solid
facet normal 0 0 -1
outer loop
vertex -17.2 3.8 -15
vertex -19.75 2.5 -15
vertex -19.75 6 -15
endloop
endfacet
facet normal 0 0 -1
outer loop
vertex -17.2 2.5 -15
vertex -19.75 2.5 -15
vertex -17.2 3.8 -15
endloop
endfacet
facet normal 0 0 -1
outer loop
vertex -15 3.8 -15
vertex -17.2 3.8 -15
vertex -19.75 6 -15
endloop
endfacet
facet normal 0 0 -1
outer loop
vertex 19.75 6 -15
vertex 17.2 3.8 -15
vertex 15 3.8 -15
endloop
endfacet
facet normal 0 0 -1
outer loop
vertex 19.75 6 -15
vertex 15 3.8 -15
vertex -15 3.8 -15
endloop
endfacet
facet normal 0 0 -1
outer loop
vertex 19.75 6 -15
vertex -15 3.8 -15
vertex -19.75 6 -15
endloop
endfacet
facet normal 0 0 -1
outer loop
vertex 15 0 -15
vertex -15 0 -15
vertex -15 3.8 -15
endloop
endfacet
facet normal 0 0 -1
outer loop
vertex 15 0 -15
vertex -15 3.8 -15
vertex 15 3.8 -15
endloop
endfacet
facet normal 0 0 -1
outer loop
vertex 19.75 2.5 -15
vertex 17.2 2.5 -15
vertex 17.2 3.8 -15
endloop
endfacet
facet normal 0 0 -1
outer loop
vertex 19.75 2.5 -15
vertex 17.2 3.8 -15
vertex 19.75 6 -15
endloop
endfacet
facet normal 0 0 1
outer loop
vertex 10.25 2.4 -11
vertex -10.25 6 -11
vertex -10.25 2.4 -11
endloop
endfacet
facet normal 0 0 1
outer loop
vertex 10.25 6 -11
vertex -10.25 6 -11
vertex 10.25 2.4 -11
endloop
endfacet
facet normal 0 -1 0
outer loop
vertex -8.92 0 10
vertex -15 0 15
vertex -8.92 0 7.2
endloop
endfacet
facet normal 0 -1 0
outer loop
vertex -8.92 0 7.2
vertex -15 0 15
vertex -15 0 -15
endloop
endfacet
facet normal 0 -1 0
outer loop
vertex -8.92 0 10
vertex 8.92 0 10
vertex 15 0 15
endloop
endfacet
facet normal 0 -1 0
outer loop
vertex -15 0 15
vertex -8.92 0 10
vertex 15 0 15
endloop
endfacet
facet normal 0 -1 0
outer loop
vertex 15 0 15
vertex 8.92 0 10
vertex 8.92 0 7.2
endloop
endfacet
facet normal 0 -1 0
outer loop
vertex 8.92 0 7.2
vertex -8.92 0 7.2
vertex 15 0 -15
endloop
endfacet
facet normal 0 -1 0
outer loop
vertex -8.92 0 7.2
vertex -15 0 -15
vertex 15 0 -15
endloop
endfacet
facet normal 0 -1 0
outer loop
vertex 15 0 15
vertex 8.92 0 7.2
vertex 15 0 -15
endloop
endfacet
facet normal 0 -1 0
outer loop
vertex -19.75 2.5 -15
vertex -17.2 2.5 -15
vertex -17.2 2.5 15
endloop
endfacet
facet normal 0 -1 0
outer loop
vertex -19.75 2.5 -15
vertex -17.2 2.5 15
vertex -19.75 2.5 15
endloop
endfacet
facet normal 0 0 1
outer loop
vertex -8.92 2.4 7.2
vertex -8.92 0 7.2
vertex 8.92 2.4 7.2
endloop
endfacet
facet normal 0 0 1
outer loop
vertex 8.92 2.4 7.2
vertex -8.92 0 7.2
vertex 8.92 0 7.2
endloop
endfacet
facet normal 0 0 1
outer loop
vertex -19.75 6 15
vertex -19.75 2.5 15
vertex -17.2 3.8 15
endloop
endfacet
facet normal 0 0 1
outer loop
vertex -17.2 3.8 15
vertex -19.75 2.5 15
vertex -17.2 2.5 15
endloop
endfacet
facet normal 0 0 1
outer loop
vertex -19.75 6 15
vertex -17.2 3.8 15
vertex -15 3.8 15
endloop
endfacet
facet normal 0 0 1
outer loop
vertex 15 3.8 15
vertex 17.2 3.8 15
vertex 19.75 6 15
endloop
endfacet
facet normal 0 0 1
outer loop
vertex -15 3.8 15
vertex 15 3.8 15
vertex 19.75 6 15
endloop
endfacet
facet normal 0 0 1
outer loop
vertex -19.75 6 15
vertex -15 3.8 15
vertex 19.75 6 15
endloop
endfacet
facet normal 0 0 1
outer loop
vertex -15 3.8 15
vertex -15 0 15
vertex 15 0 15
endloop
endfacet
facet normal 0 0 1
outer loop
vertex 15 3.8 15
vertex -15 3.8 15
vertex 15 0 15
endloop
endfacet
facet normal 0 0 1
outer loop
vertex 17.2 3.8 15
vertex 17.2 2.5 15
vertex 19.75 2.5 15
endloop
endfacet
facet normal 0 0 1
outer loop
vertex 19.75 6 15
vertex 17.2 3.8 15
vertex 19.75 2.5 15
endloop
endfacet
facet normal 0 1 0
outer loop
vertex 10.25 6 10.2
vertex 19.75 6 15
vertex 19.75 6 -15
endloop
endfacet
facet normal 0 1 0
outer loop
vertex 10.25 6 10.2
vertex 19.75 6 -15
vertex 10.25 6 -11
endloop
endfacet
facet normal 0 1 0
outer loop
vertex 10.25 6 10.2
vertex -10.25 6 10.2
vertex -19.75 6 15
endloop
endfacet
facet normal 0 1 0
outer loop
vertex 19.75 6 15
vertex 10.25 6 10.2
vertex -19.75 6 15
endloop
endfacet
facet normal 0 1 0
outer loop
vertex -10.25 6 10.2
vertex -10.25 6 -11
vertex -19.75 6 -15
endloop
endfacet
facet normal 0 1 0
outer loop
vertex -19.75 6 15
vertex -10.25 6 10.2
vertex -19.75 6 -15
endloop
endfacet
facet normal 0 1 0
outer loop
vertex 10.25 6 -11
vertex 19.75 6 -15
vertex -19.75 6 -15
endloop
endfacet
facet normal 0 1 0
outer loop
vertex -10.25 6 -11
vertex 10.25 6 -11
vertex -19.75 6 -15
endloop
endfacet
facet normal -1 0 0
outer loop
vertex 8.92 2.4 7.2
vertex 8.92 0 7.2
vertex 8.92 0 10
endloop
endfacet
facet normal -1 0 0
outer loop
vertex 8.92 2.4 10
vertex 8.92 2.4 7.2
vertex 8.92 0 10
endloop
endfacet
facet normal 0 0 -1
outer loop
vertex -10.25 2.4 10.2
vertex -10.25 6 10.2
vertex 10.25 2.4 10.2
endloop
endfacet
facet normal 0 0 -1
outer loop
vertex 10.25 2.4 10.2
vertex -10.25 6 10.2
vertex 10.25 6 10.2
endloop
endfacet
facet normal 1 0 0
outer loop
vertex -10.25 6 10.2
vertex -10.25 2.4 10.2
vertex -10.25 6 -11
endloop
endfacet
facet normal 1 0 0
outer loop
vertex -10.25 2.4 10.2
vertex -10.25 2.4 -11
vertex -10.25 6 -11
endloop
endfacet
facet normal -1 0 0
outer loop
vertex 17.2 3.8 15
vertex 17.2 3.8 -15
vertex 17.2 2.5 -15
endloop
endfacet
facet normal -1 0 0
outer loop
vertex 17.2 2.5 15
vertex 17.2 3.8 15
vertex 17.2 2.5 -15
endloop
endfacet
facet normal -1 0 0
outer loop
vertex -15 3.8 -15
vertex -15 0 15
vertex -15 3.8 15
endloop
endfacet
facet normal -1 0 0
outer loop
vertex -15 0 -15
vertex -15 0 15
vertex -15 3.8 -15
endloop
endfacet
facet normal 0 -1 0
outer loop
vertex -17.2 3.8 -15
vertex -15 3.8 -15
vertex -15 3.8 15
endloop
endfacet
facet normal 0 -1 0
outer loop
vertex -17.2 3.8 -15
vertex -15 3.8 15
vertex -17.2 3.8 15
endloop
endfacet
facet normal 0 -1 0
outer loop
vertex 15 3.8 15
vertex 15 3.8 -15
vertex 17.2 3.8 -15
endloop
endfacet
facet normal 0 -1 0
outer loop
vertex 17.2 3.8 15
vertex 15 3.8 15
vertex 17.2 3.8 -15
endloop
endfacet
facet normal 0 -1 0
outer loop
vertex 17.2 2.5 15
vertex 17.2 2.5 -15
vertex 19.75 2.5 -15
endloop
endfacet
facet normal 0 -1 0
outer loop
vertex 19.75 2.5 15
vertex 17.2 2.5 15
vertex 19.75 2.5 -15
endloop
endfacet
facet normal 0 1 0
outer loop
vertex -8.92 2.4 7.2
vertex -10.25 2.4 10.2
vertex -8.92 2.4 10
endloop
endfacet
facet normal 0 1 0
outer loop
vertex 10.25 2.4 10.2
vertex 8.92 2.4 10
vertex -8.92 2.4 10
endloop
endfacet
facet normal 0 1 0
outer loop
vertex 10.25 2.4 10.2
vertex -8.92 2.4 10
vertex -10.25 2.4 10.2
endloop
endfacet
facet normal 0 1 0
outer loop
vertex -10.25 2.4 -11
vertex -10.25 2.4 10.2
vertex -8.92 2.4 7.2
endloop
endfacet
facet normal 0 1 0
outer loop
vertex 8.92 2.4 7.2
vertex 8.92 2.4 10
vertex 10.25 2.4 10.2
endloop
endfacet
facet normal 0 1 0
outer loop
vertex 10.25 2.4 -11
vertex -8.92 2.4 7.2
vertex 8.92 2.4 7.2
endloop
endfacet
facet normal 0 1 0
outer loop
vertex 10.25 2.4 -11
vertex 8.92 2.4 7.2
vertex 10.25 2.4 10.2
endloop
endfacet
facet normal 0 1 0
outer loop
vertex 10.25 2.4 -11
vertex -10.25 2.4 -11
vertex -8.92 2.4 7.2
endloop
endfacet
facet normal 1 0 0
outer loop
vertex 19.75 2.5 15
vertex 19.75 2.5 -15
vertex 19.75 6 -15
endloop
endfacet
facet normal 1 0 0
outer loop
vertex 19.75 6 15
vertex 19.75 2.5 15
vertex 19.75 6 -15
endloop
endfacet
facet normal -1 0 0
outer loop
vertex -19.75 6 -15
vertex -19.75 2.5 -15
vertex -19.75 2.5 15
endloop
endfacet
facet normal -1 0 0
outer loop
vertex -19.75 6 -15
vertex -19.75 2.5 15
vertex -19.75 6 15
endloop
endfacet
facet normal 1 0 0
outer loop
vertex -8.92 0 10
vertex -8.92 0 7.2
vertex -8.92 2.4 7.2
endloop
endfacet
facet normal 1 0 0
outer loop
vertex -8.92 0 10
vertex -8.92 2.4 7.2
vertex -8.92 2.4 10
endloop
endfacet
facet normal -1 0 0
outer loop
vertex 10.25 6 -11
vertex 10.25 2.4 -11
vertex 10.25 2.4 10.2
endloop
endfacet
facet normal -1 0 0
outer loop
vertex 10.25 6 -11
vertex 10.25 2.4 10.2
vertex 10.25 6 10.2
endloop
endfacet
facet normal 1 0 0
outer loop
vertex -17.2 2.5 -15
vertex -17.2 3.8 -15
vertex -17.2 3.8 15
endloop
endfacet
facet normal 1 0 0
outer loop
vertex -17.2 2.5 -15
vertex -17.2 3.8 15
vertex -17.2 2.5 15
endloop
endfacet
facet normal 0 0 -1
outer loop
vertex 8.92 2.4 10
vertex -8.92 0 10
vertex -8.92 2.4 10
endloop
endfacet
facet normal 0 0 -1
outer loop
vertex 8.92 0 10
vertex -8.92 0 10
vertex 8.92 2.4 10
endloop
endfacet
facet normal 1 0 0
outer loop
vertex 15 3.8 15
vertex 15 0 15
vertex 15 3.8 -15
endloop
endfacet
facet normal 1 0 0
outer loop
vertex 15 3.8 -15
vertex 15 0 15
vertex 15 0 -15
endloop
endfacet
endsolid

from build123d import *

# Parameters (mm, degrees)
SKETCH1_W               = 30
SKETCH1_H               = 30
MAIN_BODY_DEPTH         = 11
SKETCH2_W               = 17.84
SKETCH2_H               = 2.8
WIRE_HOLE_DEPTH         = 6
BOARD_CAVITY_DEPTH      = 3
BOARD_CAVITY_DEPTH_BACK = 17.2
SKETCH3_W               = 20.5
SKETCH3_H               = 3.6
SKETCH4_W               = 10
SKETCH4_H               = 10
LIGHT_BOX_DEPTH         = 2
SKETCH5_R               = 1.5
CUT_EXTRUDE4_DEPTH      = 20
SKETCH7_W               = 20.5
SKETCH7_H               = 3.6
CUT_EXTRUDE5_DEPTH      = 1
BOSS_EXTRUDE1_DEPTH     = 30
BOSS_EXTRUDE2_START     = 0.6
SKETCH11_W              = 10
SKETCH11_H              = 10
SKETCH11_R              = 1.5
BOSS_EXTRUDE2_DEPTH     = 0.6
SKETCH12_W              = 44.814636294
SKETCH12_H              = 7.577756332
CUT_EXTRUDE6_DEPTH      = 40


with BuildPart() as part:
    # Sketch1 → Main Body (new body)
    with BuildSketch(Plane(origin=(0, 0, 0), x_dir=(1, 0, 0), z_dir=(0, 1, 0))):
        Rectangle(SKETCH1_W, SKETCH1_H)
    extrude(amount=MAIN_BODY_DEPTH)

    # Sketch2 → Wire Hole (cut)
    with BuildSketch(Plane.XZ):
        with Locations((0, 8.6)):
            Rectangle(SKETCH2_W, SKETCH2_H)
    extrude(amount=-WIRE_HOLE_DEPTH, mode=Mode.SUBTRACT)

    # Sketch3 → Board Cavity (cut, two sides: drawn at the far end of the back side and taken through both)
    with BuildSketch(Plane.XY.offset(7.2).offset(-BOARD_CAVITY_DEPTH_BACK)):
        with Locations((0, 4.2)):
            Rectangle(SKETCH3_W, SKETCH3_H)
    extrude(amount=BOARD_CAVITY_DEPTH + BOARD_CAVITY_DEPTH_BACK, mode=Mode.SUBTRACT)

    # Sketch4 → Light Box (cut)
    with BuildSketch(Plane.XZ.offset(-6)):
        with Locations((0, 0.05)):
            Rectangle(SKETCH4_W, SKETCH4_H)
    extrude(amount=-LIGHT_BOX_DEPTH, mode=Mode.SUBTRACT)

    # Sketch5 → Cut-Extrude4 (cut)
    with BuildSketch(Plane.XZ.offset(-8)):
        with Locations(Location((0, 0, 0), (0, 0, 270))):
            Circle(SKETCH5_R)
    extrude(amount=-CUT_EXTRUDE4_DEPTH, mode=Mode.SUBTRACT)

    # Sketch7 → Cut-Extrude5 (cut)
    with BuildSketch(Plane.XY.offset(-10)):
        with Locations((0, 4.2)):
            Rectangle(SKETCH7_W, SKETCH7_H)
    extrude(amount=-CUT_EXTRUDE5_DEPTH, mode=Mode.SUBTRACT)

    # Sketch8 → Boss-Extrude1 (add)
    with BuildSketch(Plane(origin=(0, 0, -15), x_dir=(-1, 0, 0), z_dir=(0, 0, -1))):
        Polygon((-15, 5.5), (-15, 3.8), (-17.2, 3.8), (-17.2, 2.5), (-19.75, 2.5), (-19.75, 8.5), (-17.2, 8.5), (-17.2, 7.2), (-15, 7.2), align=None)
    boss_extrude1 = extrude(amount=-BOSS_EXTRUDE1_DEPTH)

    # Mirror1: Boss-Extrude1 across plane
    add(boss_extrude1.mirror(Plane(origin=(0, 0, 0), x_dir=(0, 0, 1), z_dir=(1, 0, 0))))

    # Sketch9 → Cut-Revolve6 (revolve, cut)
    with BuildSketch(Plane.XY, mode=Mode.PRIVATE) as cut_revolve6_sk:
        with BuildLine():
            Line((0, 67.971820098), (0, 8))
            Line((0, 8), (-1.3, 8))
            ThreePointArc((-1.3, 8), (-29.992954197, 38.621972793), (0, 67.971820098))
        make_face()
    revolve(cut_revolve6_sk.sketch.rotate(Axis((0, 0, 0), (0, -1, 0)), 90), axis=Axis((0, 0, 0), (0, -1, 0)), mode=Mode.SUBTRACT)

    # Sketch11 → Boss-Extrude2 (add)
    with BuildSketch(Plane.XZ.offset(-8).offset(BOSS_EXTRUDE2_START)):
        with Locations((0, 0.05)):
            Rectangle(SKETCH11_W, SKETCH11_H)
        with Locations(Location((0, 0, 0), (0, 0, 270))):
            Circle(SKETCH11_R, mode=Mode.SUBTRACT)
    extrude(amount=-BOSS_EXTRUDE2_DEPTH)

    # Sketch12 → Cut-Extrude6 (cut)
    with BuildSketch(Plane(origin=(0, 0, -15), x_dir=(-1, 0, 0), z_dir=(0, 0, -1))):
        with Locations((-2.128069321, 9.788878166)):
            Rectangle(SKETCH12_W, SKETCH12_H)
    extrude(amount=-CUT_EXTRUDE6_DEPTH, mode=Mode.SUBTRACT)


solid = part.part
